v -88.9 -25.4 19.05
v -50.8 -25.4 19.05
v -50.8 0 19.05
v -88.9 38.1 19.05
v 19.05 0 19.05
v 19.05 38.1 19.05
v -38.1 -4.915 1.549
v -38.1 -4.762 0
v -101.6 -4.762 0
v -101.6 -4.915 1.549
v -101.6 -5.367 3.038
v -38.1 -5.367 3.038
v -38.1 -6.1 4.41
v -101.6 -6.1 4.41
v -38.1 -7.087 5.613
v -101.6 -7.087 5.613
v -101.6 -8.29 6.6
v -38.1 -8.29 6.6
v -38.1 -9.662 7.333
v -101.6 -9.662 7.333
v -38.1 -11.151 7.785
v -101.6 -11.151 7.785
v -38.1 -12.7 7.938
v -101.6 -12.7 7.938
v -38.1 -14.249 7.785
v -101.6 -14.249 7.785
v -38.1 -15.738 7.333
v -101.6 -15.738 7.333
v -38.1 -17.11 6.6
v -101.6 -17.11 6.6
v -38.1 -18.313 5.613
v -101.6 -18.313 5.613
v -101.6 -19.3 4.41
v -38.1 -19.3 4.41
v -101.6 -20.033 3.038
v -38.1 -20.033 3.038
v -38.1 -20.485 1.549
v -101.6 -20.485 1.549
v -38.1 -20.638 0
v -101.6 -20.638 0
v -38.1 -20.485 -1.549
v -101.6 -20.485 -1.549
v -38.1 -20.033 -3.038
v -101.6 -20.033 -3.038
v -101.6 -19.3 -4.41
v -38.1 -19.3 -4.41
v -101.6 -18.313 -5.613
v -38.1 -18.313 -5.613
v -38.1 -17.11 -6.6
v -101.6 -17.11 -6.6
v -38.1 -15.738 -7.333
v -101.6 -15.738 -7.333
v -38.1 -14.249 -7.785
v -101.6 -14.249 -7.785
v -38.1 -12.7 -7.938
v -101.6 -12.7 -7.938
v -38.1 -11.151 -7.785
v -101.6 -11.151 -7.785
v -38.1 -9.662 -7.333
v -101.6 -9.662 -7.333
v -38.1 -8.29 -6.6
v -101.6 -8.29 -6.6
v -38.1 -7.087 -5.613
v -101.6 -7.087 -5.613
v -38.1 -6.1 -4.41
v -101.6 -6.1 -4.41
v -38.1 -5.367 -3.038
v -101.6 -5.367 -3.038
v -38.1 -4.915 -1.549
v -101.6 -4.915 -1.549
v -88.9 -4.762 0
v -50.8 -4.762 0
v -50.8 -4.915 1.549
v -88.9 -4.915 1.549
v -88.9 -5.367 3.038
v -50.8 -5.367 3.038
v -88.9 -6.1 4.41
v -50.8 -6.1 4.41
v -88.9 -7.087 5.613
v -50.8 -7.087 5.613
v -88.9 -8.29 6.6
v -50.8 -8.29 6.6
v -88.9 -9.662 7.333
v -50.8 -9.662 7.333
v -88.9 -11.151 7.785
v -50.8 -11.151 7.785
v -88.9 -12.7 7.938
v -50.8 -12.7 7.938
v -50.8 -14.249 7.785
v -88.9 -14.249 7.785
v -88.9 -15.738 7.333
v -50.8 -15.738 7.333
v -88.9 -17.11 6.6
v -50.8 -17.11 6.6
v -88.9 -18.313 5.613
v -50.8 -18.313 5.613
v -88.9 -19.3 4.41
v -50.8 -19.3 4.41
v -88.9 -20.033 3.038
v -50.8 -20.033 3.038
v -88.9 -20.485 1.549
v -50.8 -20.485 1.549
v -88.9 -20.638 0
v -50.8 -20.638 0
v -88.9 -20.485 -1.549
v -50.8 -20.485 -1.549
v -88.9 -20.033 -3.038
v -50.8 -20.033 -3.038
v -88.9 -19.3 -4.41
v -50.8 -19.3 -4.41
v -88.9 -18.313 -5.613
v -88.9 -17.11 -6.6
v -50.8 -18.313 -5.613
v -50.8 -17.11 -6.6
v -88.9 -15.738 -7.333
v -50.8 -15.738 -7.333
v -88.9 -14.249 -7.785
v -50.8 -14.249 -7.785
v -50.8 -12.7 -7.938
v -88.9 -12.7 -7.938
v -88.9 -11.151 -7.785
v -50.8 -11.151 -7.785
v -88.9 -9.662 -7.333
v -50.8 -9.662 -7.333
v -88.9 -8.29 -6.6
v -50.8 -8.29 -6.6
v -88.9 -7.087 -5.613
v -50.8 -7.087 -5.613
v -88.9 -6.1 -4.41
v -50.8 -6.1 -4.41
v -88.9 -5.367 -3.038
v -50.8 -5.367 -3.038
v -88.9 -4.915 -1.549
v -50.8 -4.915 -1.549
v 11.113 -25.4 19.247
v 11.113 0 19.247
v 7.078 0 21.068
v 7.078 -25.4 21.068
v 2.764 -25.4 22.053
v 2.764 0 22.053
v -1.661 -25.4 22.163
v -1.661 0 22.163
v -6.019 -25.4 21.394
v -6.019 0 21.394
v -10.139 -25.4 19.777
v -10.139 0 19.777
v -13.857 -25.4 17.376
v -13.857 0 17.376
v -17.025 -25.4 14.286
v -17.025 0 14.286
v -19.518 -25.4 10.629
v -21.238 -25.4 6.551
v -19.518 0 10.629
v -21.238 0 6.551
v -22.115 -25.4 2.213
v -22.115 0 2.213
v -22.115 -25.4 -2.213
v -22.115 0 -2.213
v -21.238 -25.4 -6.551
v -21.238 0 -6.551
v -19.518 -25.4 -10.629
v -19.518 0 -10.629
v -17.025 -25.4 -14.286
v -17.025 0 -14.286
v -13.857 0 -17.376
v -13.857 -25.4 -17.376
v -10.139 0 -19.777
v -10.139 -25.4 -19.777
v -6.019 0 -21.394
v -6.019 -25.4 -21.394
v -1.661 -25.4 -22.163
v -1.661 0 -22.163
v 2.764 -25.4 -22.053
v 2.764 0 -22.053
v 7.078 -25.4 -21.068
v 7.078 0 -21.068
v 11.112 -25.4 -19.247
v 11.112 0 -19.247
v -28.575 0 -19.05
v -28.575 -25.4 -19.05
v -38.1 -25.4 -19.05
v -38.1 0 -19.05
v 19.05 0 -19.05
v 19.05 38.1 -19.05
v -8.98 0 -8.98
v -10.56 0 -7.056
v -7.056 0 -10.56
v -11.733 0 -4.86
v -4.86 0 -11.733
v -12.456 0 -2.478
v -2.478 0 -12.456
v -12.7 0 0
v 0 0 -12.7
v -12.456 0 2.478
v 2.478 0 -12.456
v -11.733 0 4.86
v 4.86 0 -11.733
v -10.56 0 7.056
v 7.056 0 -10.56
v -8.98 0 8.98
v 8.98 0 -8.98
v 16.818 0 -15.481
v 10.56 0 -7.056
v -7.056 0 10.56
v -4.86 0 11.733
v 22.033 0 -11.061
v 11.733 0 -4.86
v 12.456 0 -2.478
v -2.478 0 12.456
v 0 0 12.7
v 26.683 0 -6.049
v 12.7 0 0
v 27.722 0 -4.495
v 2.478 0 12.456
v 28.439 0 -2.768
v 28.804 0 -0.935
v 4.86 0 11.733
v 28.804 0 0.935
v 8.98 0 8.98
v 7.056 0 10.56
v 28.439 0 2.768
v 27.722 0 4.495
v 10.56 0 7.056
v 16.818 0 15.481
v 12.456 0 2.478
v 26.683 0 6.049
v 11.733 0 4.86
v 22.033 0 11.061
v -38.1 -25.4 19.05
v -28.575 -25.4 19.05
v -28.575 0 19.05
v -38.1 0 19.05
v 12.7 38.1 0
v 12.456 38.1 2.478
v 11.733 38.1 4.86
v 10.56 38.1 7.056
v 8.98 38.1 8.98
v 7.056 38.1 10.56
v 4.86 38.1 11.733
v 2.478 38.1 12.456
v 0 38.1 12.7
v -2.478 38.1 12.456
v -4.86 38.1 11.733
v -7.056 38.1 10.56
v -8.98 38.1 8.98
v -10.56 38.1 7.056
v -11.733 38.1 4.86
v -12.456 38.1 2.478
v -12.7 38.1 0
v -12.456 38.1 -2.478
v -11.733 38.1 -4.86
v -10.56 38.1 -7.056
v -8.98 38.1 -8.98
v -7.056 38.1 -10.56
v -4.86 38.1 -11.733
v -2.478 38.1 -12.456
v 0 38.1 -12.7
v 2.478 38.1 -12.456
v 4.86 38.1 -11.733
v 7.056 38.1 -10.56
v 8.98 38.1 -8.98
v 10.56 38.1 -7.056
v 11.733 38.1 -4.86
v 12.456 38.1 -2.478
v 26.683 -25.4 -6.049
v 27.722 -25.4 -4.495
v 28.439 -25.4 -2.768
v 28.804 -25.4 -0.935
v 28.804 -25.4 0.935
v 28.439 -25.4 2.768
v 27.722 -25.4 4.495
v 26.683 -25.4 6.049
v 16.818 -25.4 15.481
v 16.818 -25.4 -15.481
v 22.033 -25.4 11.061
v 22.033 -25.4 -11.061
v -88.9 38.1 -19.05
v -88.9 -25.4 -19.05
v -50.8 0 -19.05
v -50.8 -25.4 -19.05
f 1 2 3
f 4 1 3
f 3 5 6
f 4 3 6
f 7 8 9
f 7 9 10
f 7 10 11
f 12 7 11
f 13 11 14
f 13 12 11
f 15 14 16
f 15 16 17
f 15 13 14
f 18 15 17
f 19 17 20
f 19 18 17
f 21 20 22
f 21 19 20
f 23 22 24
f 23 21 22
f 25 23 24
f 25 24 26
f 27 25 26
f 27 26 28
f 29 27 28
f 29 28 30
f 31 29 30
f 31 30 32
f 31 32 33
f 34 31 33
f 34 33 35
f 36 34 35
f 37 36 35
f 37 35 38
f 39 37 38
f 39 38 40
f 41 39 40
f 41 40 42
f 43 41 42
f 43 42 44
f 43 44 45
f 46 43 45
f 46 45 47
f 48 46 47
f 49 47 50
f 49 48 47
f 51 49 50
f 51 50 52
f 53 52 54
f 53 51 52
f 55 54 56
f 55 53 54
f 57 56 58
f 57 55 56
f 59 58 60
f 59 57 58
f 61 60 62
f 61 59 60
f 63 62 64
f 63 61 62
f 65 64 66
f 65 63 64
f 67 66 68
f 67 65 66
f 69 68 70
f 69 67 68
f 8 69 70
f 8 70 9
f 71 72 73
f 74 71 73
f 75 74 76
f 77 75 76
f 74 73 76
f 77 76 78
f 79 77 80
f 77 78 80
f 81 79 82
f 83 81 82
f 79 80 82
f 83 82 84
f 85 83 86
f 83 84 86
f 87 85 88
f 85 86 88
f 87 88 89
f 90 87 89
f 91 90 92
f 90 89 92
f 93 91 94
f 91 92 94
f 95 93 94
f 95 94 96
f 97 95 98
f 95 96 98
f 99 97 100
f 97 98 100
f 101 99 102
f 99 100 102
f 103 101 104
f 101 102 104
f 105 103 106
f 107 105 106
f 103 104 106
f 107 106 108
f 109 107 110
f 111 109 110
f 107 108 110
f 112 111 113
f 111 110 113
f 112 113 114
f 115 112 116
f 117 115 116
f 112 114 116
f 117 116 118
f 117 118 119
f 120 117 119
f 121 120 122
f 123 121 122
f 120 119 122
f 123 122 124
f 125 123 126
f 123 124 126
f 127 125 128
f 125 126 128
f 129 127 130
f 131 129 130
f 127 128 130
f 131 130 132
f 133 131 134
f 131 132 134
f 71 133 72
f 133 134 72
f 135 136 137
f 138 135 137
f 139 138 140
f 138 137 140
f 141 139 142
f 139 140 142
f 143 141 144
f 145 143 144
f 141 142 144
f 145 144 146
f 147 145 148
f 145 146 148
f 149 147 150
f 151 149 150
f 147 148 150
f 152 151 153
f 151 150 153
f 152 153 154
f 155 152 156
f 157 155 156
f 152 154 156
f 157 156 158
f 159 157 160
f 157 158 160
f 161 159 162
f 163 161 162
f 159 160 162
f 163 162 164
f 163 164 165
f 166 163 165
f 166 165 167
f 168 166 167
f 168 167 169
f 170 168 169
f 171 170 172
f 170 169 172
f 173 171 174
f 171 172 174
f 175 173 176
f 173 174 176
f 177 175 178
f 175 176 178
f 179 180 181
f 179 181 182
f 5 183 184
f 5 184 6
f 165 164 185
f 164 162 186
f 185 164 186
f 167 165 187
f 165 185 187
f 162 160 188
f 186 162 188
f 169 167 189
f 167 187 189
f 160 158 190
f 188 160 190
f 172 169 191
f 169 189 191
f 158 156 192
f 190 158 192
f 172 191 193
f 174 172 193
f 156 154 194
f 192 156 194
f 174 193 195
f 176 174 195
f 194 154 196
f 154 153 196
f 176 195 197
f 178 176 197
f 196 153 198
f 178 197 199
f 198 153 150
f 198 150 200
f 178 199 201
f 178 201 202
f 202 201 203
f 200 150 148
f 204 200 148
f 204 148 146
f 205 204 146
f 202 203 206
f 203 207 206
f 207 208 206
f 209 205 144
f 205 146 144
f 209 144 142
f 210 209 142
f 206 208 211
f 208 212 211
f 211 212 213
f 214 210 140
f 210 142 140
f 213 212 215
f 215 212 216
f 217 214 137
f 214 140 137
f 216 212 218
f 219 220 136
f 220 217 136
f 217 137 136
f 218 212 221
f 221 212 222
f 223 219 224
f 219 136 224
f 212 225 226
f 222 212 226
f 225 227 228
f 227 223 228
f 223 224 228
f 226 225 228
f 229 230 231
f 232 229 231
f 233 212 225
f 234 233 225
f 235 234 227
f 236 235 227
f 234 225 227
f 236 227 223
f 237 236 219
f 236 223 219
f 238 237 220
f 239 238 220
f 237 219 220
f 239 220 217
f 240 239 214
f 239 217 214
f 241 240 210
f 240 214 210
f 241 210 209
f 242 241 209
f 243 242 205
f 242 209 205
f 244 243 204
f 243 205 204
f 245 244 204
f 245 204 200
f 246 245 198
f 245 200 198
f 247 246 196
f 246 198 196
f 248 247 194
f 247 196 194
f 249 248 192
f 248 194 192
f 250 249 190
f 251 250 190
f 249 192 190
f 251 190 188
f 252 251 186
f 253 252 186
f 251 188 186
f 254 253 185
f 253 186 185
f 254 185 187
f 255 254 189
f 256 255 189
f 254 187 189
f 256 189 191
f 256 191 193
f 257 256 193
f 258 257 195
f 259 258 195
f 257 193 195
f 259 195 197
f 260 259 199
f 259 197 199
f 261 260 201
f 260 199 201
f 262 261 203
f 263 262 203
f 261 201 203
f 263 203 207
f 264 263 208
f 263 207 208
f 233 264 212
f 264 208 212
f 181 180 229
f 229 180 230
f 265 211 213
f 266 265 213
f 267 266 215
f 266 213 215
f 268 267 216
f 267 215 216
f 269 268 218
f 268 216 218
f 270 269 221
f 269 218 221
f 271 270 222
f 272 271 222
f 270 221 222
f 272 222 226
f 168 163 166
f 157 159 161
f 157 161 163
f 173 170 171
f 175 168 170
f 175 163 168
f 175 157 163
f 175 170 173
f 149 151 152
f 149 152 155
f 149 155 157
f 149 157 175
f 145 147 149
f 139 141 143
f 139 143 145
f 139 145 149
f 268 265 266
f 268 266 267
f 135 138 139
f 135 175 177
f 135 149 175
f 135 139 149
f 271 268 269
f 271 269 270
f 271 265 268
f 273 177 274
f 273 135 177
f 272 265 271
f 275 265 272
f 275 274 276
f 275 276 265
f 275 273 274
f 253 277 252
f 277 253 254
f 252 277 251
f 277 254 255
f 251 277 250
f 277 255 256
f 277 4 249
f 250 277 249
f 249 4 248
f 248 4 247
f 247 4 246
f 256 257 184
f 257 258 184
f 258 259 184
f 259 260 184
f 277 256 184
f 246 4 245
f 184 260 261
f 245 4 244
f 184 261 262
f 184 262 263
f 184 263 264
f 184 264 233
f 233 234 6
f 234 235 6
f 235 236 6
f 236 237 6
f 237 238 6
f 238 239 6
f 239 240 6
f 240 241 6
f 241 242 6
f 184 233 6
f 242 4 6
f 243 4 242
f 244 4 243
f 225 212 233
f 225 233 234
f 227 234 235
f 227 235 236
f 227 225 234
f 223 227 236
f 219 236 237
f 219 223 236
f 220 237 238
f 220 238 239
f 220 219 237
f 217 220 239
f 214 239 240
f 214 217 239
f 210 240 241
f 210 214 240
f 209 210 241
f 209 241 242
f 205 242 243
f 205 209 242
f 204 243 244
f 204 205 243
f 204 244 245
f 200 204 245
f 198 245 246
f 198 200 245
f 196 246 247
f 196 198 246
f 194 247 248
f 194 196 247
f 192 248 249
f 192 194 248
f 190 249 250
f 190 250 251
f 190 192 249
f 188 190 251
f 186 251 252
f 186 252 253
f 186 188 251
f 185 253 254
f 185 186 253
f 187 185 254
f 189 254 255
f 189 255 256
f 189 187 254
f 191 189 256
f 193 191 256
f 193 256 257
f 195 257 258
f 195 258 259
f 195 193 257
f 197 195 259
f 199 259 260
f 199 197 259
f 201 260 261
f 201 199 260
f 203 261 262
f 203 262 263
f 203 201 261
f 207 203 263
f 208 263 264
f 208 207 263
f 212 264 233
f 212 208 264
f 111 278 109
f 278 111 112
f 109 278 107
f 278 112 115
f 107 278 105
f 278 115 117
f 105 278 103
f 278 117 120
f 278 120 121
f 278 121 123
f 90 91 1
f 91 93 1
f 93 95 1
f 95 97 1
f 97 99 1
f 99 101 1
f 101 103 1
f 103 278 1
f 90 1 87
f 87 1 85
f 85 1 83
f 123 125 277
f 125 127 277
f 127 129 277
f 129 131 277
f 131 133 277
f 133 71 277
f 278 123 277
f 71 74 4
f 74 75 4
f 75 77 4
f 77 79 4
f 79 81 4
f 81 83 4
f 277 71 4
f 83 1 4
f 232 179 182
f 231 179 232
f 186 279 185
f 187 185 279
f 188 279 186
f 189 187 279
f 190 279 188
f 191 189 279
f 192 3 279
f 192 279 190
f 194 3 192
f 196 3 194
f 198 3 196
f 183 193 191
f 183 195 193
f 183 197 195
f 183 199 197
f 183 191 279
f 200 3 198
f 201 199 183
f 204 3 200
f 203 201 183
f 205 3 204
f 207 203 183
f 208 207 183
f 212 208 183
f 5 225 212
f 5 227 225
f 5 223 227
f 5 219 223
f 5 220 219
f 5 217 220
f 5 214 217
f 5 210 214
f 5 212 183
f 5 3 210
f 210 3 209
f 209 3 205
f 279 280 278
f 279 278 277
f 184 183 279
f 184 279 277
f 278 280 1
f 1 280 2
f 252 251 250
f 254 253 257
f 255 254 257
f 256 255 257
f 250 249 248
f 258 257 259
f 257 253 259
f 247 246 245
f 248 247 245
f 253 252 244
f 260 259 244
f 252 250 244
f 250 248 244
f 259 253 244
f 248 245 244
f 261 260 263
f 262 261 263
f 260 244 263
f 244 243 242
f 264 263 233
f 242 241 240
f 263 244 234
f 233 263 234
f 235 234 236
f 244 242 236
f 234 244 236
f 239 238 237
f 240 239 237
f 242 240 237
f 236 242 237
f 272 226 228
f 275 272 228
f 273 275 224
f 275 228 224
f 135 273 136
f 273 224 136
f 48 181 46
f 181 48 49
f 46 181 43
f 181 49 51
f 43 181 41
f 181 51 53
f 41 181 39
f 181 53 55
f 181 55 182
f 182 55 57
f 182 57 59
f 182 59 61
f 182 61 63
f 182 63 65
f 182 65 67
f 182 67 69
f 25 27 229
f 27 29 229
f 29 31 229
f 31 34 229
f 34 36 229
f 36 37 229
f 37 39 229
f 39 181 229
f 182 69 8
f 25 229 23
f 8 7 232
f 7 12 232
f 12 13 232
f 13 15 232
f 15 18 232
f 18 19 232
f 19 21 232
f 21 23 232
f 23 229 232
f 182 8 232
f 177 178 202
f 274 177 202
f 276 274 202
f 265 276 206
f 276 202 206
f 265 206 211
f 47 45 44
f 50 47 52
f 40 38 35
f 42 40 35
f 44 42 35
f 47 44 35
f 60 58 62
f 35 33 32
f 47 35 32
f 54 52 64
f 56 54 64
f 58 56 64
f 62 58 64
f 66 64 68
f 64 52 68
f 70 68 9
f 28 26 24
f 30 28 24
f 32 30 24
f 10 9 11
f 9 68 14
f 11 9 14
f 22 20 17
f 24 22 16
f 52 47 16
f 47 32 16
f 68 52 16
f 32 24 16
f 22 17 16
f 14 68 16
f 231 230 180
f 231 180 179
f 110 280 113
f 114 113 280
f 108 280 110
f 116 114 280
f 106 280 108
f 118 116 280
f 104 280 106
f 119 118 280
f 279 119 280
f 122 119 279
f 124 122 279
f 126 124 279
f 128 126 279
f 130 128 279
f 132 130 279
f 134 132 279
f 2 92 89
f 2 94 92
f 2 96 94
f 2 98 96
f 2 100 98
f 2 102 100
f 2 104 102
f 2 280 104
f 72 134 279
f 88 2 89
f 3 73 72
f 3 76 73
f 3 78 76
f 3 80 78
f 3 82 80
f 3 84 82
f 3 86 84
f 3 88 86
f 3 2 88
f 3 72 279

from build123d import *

# Parameters (mm, degrees)
F0_R          = 12.7
F1_DEPTH      = 25.4
F2_R          = 12.7
F3_DEPTH      = 25.4
F3_DEPTH_BACK = 38.1
F4_W          = 107.95
F4_H          = 38.1
F4_R          = 12.7
F5_DEPTH      = 38.1
F7_START      = -50.8
F6_W          = 25.4
F6_H          = 38.1
F6_R          = 7.9375
F7_DEPTH      = 38.1
F8_START      = -28.575
F8_DEPTH      = 9.525
F10_START     = -28.575
F9_R          = 7.9375
F10_DEPTH     = 73.025


with BuildPart() as f1:
    # F0 (on Front) → F1 (new body)
    with BuildSketch(Plane.XZ):
        with BuildLine():
            ThreePointArc((26.682561162, 6.0491874454), (19.4915271669, 13.3490438618), (11.1125, 19.2474145991))
            ThreePointArc((11.1125, 19.2474145991), (-22.225, 0), (11.1125, -19.2474145991))
            ThreePointArc((11.1125, -19.2474145991), (19.4915271669, -13.3490438618), (26.682561162, -6.0491874454))
            ThreePointArc((26.682561162, -6.0491874454), (28.8500509684, 0), (26.682561162, 6.0491874454))
        make_face()
        Circle(F0_R, mode=Mode.SUBTRACT)
    extrude(amount=F1_DEPTH)

    # F2 (on Front) → F3 (join, two sides)
    with BuildSketch(Plane.XZ) as f3_sk:
        Circle(F2_R)
    extrude(amount=F3_DEPTH)
    extrude(f3_sk.sketch, amount=-F3_DEPTH_BACK)


with BuildPart() as f5:
    # F4 (on Front) → F5 (new body)
    with BuildSketch(Plane.XZ):
        with Locations((-34.925, 0)):
            Rectangle(F4_W, F4_H)
        Circle(F4_R, mode=Mode.SUBTRACT)
    extrude(amount=-F5_DEPTH)

    # F6 (on Right) → F7 (join)
    with BuildSketch(Plane.YZ.offset(F7_START)):
        with Locations((-12.7, 0)):
            Rectangle(F6_W, F6_H)
        with Locations((-12.7, 0)):
            Circle(F6_R, mode=Mode.SUBTRACT)
    extrude(amount=-F7_DEPTH)


with BuildPart() as f8:
    # F6 (on Right) → F8 (new body)
    with BuildSketch(Plane.YZ.offset(F8_START)):
        with Locations((-12.7, 0)):
            Rectangle(F6_W, F6_H)
        with Locations((-12.7, 0)):
            Circle(F6_R, mode=Mode.SUBTRACT)
    extrude(amount=-F8_DEPTH)

    # F9 (on Right) → F10 (join)
    with BuildSketch(Plane.YZ.offset(F10_START)):
        with Locations((-12.7, 0)):
            Circle(F9_R)
    extrude(amount=-F10_DEPTH)


solid = Compound([f1.part, f5.part, f8.part])
